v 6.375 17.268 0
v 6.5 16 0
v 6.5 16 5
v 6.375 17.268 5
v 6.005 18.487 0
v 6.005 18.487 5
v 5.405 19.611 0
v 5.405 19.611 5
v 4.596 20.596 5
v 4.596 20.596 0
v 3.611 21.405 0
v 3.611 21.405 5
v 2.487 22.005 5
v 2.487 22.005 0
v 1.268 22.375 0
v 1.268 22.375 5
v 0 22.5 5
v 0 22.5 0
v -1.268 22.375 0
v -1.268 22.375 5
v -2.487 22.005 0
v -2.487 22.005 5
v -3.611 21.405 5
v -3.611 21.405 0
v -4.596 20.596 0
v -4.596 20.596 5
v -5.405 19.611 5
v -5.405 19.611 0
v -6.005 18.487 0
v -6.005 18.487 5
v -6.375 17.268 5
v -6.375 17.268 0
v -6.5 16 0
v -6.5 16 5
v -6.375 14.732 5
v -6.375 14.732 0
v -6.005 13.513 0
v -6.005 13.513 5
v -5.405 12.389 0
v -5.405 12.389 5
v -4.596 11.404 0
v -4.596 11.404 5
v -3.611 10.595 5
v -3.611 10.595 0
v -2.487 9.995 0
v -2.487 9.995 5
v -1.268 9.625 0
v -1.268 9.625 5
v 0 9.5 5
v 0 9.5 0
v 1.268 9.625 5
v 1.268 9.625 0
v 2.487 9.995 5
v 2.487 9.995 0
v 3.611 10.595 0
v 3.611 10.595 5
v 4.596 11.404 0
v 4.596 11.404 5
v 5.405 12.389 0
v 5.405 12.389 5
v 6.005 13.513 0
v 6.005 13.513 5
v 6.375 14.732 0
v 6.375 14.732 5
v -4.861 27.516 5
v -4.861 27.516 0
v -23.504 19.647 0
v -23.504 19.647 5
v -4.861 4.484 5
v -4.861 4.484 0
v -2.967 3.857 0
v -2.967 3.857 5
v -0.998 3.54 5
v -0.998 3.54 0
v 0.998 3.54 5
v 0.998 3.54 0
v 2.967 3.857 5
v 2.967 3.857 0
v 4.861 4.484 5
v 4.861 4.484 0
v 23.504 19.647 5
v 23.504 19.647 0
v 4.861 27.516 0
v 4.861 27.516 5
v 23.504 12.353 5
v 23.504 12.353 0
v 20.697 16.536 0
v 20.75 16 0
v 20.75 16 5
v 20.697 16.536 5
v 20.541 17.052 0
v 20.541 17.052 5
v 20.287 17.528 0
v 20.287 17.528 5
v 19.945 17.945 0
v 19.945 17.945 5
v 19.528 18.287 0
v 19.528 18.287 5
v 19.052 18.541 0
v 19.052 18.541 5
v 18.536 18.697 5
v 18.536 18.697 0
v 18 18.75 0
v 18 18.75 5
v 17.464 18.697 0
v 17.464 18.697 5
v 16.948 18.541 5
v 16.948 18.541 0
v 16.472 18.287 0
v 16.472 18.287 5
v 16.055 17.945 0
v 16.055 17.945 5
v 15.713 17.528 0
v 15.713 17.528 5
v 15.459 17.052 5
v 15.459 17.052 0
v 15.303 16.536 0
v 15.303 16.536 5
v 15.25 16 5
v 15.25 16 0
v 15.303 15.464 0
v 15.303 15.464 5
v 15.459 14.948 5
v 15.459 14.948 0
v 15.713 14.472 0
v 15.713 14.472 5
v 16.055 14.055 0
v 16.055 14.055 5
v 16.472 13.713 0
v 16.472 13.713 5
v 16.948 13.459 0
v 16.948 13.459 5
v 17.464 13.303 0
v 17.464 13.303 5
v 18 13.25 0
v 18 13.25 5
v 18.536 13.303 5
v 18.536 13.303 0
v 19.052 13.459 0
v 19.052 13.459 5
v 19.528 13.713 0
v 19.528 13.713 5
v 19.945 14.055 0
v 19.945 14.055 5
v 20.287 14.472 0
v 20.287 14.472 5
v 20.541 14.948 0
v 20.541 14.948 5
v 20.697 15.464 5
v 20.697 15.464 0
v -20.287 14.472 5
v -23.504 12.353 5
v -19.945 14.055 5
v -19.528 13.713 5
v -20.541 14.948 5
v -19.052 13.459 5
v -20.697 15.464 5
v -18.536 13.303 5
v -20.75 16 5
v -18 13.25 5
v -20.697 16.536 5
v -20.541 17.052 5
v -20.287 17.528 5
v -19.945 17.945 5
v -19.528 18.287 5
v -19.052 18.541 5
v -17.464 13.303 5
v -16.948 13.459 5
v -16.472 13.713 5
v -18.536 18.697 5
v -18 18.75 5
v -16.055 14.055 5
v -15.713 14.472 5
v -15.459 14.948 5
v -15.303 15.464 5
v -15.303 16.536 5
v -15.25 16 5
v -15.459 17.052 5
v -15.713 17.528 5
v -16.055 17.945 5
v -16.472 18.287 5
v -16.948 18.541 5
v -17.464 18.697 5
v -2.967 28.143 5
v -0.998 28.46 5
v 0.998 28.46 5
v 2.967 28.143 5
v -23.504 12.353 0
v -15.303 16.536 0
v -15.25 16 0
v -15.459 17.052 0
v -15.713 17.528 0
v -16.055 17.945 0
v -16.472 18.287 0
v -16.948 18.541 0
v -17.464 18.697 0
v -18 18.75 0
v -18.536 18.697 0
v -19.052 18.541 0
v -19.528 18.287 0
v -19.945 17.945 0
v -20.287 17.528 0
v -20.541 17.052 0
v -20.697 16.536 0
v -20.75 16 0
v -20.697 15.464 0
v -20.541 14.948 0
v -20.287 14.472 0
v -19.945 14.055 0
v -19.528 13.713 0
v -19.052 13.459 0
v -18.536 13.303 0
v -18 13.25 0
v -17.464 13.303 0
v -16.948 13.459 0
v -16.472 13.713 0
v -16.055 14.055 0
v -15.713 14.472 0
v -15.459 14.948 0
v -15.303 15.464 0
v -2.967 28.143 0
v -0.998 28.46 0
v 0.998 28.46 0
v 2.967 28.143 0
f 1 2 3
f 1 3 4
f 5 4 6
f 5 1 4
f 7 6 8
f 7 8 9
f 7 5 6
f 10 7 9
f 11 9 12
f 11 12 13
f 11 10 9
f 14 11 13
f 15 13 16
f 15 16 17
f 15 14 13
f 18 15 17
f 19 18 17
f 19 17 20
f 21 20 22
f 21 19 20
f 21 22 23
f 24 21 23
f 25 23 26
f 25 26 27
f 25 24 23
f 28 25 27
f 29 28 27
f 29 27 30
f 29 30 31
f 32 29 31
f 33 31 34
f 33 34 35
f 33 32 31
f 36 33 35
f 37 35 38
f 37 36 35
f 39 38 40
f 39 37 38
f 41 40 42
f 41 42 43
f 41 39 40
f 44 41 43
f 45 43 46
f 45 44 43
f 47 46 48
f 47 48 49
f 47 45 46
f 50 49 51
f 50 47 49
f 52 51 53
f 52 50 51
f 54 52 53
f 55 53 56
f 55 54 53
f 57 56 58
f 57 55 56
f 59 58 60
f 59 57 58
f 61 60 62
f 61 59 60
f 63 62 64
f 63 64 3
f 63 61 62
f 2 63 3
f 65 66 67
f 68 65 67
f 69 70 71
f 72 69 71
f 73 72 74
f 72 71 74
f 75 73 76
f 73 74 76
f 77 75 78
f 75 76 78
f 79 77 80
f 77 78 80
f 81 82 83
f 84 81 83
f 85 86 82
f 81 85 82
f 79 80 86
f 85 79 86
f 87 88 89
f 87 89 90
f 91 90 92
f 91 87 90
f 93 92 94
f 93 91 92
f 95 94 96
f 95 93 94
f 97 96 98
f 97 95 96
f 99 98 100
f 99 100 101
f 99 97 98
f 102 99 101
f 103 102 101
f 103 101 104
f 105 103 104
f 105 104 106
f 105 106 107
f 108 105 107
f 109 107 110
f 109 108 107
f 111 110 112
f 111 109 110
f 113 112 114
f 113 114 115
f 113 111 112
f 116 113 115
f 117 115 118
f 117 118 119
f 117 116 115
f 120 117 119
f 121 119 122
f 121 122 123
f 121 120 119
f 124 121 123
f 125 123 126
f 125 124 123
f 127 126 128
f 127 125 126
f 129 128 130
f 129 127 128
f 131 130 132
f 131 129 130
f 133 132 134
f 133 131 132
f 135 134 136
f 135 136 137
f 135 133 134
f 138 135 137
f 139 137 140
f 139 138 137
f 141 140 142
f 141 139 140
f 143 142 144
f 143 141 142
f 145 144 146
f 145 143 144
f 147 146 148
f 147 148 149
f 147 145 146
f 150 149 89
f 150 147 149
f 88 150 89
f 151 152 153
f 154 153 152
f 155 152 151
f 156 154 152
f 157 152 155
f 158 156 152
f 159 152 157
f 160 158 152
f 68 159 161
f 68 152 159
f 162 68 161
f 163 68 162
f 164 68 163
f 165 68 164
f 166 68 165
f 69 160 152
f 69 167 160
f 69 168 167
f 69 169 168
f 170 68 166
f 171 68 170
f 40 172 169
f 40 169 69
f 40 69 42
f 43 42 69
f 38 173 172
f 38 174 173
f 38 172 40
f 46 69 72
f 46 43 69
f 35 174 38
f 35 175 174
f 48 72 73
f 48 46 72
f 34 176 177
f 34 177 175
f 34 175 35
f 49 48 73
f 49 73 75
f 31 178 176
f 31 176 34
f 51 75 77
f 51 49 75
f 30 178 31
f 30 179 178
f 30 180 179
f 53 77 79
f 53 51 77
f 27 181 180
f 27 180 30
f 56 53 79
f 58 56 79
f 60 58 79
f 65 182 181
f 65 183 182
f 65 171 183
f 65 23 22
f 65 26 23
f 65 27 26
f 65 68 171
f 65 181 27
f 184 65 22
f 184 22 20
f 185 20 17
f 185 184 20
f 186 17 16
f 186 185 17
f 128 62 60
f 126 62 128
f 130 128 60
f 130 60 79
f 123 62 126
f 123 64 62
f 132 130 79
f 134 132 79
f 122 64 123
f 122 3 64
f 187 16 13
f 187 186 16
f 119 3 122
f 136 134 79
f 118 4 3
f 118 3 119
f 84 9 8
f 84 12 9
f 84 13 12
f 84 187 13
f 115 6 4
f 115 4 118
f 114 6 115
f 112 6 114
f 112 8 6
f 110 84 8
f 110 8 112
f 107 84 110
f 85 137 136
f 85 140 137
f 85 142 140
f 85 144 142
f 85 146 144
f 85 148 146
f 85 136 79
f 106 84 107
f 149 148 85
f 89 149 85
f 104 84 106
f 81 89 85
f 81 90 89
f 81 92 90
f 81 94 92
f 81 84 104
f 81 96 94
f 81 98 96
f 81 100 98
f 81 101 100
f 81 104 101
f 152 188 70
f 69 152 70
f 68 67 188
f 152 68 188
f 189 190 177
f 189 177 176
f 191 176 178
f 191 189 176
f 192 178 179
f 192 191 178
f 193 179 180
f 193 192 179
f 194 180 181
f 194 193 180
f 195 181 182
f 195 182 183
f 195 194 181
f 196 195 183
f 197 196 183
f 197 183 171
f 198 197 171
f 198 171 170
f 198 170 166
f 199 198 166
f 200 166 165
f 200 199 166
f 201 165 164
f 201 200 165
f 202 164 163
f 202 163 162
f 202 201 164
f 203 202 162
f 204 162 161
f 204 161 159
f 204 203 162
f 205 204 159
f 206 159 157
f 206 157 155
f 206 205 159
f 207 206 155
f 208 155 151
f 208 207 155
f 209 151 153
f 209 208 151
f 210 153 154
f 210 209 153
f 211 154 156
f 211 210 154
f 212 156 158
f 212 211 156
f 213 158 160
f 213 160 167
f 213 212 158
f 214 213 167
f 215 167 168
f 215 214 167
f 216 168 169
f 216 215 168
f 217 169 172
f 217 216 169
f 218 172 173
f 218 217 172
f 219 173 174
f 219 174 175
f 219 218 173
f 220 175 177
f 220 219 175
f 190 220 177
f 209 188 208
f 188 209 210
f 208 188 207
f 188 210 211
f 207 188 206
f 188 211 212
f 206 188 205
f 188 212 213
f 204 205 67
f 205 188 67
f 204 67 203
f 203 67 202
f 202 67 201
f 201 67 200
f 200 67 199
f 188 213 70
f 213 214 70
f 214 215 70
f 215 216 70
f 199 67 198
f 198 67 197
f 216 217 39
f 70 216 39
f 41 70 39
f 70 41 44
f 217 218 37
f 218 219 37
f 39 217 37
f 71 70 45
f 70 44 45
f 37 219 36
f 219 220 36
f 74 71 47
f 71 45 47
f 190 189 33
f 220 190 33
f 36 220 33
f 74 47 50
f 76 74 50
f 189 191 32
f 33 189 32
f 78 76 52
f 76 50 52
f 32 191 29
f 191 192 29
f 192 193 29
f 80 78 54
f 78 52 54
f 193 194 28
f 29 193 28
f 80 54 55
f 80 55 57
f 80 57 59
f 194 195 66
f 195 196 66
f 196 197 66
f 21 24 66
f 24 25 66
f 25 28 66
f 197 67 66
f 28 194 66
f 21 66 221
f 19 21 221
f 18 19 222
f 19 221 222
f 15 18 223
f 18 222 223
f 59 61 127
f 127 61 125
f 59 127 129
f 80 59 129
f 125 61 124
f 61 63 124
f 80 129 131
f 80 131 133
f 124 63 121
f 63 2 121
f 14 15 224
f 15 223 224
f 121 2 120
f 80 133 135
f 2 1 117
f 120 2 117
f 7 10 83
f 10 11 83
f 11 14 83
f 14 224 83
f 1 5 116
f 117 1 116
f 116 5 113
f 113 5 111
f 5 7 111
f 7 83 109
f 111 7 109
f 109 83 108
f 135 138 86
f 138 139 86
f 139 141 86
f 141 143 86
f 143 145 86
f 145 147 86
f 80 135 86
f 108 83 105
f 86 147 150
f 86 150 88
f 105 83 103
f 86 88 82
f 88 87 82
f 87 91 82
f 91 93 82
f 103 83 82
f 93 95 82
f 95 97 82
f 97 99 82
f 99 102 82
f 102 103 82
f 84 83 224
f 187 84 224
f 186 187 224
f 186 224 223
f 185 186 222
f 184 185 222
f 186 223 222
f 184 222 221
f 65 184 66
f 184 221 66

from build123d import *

# Parameters (mm, degrees)
SKETCH1_R           = 6.5
SKETCH1_R_2         = 2.75
BOSS_EXTRUDE1_DEPTH = 5


with BuildPart() as part:
    # Sketch1 → Boss-Extrude1 (new body)
    with BuildSketch(Plane.XY):
        with BuildLine():
            Line((-23.503678525, 19.646734505), (-23.503678525, 12.353265495))
            Line((-23.503678525, 12.353265495), (-4.861111111, 4.4839417))
            ThreePointArc((-4.861111111, 4.4839417), (0, 3.5), (4.861111111, 4.4839417))
            Line((4.861111111, 4.4839417), (23.503678525, 12.353265495))
            Line((23.503678525, 12.353265495), (23.503678525, 19.646734505))
            Line((23.503678525, 19.646734505), (4.861111111, 27.5160583))
            ThreePointArc((4.861111111, 27.5160583), (0, 28.5), (-4.861111111, 27.5160583))
            Line((-4.861111111, 27.5160583), (-23.503678525, 19.646734505))
        make_face()
        with Locations((0, 16)):
            Circle(SKETCH1_R, mode=Mode.SUBTRACT)
        with Locations((-18, 16)):
            Circle(SKETCH1_R_2, mode=Mode.SUBTRACT)
        with Locations((18, 16)):
            Circle(SKETCH1_R_2, mode=Mode.SUBTRACT)
    extrude(amount=BOSS_EXTRUDE1_DEPTH)


solid = part.part
